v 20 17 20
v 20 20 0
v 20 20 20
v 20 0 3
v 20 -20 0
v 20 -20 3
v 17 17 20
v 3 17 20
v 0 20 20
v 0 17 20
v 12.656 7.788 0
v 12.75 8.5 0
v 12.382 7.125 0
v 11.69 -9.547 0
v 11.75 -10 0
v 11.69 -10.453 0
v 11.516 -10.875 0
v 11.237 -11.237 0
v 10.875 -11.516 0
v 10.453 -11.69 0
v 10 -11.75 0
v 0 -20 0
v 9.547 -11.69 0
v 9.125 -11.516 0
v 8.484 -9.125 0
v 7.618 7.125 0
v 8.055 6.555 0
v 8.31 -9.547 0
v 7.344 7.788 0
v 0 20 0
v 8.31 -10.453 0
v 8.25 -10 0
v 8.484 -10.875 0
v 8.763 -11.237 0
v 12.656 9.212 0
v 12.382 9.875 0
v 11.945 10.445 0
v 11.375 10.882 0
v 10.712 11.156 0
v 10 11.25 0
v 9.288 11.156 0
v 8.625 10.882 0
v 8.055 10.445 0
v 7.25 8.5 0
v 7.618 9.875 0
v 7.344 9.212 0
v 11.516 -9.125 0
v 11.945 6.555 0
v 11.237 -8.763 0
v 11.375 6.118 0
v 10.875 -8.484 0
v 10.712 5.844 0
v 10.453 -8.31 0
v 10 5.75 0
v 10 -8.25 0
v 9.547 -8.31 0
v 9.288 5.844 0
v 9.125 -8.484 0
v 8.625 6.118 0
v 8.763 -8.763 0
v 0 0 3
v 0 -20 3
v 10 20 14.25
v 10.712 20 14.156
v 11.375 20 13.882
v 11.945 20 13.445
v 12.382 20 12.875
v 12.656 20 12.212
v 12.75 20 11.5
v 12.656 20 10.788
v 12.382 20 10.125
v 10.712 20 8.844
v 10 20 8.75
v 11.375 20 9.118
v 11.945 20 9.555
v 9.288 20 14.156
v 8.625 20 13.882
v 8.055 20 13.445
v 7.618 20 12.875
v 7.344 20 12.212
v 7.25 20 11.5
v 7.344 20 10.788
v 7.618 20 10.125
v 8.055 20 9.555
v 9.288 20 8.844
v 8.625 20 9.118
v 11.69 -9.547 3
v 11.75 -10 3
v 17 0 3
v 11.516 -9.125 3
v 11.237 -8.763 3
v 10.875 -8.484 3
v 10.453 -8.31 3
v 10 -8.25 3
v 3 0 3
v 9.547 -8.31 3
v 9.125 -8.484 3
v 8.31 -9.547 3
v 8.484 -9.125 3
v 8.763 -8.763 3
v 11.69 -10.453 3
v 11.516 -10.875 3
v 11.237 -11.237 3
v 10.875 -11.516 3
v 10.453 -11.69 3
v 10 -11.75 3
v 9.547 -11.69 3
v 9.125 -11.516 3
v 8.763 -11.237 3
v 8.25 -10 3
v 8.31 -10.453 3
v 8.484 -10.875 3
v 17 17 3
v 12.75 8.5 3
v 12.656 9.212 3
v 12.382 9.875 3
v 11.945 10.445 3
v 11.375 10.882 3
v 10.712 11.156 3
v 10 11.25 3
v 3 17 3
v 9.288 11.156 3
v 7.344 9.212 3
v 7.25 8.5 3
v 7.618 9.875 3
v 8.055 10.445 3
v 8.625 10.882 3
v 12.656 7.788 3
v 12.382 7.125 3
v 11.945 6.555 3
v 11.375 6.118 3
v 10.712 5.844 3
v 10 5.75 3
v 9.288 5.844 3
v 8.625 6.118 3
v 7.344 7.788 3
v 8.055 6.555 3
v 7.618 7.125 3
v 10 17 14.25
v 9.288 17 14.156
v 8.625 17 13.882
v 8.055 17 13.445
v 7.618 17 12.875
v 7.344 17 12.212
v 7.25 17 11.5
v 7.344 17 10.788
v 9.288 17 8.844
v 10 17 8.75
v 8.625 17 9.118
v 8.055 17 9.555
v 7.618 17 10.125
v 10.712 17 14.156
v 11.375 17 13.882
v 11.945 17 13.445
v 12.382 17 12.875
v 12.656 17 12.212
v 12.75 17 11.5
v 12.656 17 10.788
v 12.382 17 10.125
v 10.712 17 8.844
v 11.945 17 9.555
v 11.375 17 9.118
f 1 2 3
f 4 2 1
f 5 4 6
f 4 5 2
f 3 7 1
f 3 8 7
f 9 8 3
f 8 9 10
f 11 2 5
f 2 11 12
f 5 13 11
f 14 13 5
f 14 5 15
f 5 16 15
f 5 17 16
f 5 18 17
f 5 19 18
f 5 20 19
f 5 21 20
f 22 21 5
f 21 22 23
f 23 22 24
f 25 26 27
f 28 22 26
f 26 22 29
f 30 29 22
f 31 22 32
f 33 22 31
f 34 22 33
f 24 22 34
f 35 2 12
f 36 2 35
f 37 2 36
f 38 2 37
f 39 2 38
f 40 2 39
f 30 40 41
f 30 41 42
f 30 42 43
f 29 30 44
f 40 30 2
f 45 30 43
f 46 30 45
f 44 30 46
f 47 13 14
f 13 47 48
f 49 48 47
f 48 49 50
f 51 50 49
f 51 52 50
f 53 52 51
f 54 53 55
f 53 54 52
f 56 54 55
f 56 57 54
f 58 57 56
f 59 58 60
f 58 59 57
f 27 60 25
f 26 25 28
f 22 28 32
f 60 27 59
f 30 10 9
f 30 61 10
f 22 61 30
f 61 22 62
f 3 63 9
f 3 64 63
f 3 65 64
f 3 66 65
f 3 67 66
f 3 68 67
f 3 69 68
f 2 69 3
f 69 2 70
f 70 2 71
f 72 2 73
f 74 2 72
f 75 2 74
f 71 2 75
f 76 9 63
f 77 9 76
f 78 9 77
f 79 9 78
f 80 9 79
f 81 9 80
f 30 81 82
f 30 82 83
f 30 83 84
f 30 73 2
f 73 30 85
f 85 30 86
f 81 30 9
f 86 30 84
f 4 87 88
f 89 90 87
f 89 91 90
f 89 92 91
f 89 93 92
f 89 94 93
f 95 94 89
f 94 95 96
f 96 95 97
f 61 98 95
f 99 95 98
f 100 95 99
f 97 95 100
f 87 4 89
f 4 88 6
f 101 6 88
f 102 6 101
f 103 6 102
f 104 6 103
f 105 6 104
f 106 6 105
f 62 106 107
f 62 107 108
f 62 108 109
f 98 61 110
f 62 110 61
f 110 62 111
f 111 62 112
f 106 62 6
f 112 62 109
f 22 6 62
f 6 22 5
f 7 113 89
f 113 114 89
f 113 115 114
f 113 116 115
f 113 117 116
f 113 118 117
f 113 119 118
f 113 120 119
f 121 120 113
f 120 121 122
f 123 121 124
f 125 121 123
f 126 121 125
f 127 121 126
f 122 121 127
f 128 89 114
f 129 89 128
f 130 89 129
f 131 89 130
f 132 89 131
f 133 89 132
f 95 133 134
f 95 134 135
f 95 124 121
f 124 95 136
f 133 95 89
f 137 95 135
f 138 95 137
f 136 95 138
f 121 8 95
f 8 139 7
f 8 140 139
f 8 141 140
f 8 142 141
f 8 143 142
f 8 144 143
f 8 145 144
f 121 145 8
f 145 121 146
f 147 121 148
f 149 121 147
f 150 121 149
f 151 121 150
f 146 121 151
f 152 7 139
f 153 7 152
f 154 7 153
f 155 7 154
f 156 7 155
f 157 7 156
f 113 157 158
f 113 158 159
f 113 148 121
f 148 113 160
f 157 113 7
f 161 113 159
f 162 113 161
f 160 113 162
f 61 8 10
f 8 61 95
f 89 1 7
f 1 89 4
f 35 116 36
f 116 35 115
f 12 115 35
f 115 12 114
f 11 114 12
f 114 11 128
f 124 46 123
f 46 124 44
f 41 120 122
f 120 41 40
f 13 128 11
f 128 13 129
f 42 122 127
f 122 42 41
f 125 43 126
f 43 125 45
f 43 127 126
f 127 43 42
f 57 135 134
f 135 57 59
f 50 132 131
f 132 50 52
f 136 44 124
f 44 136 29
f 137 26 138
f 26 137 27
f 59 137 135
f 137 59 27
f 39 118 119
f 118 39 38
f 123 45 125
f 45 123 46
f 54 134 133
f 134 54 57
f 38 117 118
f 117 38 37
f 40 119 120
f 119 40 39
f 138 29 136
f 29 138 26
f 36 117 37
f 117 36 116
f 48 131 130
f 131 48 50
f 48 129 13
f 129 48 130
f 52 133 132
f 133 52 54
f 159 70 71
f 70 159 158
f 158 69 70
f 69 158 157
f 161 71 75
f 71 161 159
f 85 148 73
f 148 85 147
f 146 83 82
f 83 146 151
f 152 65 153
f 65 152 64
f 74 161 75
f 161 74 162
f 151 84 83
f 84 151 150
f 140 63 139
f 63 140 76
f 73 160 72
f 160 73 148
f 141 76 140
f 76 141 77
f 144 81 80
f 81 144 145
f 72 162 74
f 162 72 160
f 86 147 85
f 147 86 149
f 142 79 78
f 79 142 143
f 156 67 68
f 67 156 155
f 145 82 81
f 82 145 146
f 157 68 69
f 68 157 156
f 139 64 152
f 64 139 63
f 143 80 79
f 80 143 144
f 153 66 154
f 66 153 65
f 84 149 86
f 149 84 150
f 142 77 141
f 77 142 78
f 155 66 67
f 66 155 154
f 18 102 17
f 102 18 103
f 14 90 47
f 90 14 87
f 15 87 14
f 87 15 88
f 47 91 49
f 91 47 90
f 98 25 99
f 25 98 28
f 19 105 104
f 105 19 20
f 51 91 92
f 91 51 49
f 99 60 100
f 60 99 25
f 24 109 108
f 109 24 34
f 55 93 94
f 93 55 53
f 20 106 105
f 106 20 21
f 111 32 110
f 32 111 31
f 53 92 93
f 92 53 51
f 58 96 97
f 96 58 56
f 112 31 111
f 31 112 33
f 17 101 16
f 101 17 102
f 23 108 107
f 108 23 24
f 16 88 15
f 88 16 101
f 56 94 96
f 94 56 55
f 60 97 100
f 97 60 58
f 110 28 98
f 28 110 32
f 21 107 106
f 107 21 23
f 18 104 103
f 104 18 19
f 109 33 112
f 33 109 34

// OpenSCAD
difference()
{
    union()
    {
        translate([0,0,0])
            cube([20,20,20]);
        translate([0,-20,0])
            cube([20,20,3]);
    }
    union()
    {
        translate([3,0,3])
            cube([14,17,17]);
        
        translate([0,0,3])
            rotate([45,0,0])
                cube([20,30,20]);
        
        translate([10,17/2,0])
            cylinder(d=5.5,h=3,$fn=24);
        
        translate([10,17,3+17/2])
            rotate([270,0,0])
                cylinder(d=5.5,h=3,$fn=24);
        
        translate([10,-10,0])
            cylinder(d=3.5,h=4,$fn=24);
    }
    
}
